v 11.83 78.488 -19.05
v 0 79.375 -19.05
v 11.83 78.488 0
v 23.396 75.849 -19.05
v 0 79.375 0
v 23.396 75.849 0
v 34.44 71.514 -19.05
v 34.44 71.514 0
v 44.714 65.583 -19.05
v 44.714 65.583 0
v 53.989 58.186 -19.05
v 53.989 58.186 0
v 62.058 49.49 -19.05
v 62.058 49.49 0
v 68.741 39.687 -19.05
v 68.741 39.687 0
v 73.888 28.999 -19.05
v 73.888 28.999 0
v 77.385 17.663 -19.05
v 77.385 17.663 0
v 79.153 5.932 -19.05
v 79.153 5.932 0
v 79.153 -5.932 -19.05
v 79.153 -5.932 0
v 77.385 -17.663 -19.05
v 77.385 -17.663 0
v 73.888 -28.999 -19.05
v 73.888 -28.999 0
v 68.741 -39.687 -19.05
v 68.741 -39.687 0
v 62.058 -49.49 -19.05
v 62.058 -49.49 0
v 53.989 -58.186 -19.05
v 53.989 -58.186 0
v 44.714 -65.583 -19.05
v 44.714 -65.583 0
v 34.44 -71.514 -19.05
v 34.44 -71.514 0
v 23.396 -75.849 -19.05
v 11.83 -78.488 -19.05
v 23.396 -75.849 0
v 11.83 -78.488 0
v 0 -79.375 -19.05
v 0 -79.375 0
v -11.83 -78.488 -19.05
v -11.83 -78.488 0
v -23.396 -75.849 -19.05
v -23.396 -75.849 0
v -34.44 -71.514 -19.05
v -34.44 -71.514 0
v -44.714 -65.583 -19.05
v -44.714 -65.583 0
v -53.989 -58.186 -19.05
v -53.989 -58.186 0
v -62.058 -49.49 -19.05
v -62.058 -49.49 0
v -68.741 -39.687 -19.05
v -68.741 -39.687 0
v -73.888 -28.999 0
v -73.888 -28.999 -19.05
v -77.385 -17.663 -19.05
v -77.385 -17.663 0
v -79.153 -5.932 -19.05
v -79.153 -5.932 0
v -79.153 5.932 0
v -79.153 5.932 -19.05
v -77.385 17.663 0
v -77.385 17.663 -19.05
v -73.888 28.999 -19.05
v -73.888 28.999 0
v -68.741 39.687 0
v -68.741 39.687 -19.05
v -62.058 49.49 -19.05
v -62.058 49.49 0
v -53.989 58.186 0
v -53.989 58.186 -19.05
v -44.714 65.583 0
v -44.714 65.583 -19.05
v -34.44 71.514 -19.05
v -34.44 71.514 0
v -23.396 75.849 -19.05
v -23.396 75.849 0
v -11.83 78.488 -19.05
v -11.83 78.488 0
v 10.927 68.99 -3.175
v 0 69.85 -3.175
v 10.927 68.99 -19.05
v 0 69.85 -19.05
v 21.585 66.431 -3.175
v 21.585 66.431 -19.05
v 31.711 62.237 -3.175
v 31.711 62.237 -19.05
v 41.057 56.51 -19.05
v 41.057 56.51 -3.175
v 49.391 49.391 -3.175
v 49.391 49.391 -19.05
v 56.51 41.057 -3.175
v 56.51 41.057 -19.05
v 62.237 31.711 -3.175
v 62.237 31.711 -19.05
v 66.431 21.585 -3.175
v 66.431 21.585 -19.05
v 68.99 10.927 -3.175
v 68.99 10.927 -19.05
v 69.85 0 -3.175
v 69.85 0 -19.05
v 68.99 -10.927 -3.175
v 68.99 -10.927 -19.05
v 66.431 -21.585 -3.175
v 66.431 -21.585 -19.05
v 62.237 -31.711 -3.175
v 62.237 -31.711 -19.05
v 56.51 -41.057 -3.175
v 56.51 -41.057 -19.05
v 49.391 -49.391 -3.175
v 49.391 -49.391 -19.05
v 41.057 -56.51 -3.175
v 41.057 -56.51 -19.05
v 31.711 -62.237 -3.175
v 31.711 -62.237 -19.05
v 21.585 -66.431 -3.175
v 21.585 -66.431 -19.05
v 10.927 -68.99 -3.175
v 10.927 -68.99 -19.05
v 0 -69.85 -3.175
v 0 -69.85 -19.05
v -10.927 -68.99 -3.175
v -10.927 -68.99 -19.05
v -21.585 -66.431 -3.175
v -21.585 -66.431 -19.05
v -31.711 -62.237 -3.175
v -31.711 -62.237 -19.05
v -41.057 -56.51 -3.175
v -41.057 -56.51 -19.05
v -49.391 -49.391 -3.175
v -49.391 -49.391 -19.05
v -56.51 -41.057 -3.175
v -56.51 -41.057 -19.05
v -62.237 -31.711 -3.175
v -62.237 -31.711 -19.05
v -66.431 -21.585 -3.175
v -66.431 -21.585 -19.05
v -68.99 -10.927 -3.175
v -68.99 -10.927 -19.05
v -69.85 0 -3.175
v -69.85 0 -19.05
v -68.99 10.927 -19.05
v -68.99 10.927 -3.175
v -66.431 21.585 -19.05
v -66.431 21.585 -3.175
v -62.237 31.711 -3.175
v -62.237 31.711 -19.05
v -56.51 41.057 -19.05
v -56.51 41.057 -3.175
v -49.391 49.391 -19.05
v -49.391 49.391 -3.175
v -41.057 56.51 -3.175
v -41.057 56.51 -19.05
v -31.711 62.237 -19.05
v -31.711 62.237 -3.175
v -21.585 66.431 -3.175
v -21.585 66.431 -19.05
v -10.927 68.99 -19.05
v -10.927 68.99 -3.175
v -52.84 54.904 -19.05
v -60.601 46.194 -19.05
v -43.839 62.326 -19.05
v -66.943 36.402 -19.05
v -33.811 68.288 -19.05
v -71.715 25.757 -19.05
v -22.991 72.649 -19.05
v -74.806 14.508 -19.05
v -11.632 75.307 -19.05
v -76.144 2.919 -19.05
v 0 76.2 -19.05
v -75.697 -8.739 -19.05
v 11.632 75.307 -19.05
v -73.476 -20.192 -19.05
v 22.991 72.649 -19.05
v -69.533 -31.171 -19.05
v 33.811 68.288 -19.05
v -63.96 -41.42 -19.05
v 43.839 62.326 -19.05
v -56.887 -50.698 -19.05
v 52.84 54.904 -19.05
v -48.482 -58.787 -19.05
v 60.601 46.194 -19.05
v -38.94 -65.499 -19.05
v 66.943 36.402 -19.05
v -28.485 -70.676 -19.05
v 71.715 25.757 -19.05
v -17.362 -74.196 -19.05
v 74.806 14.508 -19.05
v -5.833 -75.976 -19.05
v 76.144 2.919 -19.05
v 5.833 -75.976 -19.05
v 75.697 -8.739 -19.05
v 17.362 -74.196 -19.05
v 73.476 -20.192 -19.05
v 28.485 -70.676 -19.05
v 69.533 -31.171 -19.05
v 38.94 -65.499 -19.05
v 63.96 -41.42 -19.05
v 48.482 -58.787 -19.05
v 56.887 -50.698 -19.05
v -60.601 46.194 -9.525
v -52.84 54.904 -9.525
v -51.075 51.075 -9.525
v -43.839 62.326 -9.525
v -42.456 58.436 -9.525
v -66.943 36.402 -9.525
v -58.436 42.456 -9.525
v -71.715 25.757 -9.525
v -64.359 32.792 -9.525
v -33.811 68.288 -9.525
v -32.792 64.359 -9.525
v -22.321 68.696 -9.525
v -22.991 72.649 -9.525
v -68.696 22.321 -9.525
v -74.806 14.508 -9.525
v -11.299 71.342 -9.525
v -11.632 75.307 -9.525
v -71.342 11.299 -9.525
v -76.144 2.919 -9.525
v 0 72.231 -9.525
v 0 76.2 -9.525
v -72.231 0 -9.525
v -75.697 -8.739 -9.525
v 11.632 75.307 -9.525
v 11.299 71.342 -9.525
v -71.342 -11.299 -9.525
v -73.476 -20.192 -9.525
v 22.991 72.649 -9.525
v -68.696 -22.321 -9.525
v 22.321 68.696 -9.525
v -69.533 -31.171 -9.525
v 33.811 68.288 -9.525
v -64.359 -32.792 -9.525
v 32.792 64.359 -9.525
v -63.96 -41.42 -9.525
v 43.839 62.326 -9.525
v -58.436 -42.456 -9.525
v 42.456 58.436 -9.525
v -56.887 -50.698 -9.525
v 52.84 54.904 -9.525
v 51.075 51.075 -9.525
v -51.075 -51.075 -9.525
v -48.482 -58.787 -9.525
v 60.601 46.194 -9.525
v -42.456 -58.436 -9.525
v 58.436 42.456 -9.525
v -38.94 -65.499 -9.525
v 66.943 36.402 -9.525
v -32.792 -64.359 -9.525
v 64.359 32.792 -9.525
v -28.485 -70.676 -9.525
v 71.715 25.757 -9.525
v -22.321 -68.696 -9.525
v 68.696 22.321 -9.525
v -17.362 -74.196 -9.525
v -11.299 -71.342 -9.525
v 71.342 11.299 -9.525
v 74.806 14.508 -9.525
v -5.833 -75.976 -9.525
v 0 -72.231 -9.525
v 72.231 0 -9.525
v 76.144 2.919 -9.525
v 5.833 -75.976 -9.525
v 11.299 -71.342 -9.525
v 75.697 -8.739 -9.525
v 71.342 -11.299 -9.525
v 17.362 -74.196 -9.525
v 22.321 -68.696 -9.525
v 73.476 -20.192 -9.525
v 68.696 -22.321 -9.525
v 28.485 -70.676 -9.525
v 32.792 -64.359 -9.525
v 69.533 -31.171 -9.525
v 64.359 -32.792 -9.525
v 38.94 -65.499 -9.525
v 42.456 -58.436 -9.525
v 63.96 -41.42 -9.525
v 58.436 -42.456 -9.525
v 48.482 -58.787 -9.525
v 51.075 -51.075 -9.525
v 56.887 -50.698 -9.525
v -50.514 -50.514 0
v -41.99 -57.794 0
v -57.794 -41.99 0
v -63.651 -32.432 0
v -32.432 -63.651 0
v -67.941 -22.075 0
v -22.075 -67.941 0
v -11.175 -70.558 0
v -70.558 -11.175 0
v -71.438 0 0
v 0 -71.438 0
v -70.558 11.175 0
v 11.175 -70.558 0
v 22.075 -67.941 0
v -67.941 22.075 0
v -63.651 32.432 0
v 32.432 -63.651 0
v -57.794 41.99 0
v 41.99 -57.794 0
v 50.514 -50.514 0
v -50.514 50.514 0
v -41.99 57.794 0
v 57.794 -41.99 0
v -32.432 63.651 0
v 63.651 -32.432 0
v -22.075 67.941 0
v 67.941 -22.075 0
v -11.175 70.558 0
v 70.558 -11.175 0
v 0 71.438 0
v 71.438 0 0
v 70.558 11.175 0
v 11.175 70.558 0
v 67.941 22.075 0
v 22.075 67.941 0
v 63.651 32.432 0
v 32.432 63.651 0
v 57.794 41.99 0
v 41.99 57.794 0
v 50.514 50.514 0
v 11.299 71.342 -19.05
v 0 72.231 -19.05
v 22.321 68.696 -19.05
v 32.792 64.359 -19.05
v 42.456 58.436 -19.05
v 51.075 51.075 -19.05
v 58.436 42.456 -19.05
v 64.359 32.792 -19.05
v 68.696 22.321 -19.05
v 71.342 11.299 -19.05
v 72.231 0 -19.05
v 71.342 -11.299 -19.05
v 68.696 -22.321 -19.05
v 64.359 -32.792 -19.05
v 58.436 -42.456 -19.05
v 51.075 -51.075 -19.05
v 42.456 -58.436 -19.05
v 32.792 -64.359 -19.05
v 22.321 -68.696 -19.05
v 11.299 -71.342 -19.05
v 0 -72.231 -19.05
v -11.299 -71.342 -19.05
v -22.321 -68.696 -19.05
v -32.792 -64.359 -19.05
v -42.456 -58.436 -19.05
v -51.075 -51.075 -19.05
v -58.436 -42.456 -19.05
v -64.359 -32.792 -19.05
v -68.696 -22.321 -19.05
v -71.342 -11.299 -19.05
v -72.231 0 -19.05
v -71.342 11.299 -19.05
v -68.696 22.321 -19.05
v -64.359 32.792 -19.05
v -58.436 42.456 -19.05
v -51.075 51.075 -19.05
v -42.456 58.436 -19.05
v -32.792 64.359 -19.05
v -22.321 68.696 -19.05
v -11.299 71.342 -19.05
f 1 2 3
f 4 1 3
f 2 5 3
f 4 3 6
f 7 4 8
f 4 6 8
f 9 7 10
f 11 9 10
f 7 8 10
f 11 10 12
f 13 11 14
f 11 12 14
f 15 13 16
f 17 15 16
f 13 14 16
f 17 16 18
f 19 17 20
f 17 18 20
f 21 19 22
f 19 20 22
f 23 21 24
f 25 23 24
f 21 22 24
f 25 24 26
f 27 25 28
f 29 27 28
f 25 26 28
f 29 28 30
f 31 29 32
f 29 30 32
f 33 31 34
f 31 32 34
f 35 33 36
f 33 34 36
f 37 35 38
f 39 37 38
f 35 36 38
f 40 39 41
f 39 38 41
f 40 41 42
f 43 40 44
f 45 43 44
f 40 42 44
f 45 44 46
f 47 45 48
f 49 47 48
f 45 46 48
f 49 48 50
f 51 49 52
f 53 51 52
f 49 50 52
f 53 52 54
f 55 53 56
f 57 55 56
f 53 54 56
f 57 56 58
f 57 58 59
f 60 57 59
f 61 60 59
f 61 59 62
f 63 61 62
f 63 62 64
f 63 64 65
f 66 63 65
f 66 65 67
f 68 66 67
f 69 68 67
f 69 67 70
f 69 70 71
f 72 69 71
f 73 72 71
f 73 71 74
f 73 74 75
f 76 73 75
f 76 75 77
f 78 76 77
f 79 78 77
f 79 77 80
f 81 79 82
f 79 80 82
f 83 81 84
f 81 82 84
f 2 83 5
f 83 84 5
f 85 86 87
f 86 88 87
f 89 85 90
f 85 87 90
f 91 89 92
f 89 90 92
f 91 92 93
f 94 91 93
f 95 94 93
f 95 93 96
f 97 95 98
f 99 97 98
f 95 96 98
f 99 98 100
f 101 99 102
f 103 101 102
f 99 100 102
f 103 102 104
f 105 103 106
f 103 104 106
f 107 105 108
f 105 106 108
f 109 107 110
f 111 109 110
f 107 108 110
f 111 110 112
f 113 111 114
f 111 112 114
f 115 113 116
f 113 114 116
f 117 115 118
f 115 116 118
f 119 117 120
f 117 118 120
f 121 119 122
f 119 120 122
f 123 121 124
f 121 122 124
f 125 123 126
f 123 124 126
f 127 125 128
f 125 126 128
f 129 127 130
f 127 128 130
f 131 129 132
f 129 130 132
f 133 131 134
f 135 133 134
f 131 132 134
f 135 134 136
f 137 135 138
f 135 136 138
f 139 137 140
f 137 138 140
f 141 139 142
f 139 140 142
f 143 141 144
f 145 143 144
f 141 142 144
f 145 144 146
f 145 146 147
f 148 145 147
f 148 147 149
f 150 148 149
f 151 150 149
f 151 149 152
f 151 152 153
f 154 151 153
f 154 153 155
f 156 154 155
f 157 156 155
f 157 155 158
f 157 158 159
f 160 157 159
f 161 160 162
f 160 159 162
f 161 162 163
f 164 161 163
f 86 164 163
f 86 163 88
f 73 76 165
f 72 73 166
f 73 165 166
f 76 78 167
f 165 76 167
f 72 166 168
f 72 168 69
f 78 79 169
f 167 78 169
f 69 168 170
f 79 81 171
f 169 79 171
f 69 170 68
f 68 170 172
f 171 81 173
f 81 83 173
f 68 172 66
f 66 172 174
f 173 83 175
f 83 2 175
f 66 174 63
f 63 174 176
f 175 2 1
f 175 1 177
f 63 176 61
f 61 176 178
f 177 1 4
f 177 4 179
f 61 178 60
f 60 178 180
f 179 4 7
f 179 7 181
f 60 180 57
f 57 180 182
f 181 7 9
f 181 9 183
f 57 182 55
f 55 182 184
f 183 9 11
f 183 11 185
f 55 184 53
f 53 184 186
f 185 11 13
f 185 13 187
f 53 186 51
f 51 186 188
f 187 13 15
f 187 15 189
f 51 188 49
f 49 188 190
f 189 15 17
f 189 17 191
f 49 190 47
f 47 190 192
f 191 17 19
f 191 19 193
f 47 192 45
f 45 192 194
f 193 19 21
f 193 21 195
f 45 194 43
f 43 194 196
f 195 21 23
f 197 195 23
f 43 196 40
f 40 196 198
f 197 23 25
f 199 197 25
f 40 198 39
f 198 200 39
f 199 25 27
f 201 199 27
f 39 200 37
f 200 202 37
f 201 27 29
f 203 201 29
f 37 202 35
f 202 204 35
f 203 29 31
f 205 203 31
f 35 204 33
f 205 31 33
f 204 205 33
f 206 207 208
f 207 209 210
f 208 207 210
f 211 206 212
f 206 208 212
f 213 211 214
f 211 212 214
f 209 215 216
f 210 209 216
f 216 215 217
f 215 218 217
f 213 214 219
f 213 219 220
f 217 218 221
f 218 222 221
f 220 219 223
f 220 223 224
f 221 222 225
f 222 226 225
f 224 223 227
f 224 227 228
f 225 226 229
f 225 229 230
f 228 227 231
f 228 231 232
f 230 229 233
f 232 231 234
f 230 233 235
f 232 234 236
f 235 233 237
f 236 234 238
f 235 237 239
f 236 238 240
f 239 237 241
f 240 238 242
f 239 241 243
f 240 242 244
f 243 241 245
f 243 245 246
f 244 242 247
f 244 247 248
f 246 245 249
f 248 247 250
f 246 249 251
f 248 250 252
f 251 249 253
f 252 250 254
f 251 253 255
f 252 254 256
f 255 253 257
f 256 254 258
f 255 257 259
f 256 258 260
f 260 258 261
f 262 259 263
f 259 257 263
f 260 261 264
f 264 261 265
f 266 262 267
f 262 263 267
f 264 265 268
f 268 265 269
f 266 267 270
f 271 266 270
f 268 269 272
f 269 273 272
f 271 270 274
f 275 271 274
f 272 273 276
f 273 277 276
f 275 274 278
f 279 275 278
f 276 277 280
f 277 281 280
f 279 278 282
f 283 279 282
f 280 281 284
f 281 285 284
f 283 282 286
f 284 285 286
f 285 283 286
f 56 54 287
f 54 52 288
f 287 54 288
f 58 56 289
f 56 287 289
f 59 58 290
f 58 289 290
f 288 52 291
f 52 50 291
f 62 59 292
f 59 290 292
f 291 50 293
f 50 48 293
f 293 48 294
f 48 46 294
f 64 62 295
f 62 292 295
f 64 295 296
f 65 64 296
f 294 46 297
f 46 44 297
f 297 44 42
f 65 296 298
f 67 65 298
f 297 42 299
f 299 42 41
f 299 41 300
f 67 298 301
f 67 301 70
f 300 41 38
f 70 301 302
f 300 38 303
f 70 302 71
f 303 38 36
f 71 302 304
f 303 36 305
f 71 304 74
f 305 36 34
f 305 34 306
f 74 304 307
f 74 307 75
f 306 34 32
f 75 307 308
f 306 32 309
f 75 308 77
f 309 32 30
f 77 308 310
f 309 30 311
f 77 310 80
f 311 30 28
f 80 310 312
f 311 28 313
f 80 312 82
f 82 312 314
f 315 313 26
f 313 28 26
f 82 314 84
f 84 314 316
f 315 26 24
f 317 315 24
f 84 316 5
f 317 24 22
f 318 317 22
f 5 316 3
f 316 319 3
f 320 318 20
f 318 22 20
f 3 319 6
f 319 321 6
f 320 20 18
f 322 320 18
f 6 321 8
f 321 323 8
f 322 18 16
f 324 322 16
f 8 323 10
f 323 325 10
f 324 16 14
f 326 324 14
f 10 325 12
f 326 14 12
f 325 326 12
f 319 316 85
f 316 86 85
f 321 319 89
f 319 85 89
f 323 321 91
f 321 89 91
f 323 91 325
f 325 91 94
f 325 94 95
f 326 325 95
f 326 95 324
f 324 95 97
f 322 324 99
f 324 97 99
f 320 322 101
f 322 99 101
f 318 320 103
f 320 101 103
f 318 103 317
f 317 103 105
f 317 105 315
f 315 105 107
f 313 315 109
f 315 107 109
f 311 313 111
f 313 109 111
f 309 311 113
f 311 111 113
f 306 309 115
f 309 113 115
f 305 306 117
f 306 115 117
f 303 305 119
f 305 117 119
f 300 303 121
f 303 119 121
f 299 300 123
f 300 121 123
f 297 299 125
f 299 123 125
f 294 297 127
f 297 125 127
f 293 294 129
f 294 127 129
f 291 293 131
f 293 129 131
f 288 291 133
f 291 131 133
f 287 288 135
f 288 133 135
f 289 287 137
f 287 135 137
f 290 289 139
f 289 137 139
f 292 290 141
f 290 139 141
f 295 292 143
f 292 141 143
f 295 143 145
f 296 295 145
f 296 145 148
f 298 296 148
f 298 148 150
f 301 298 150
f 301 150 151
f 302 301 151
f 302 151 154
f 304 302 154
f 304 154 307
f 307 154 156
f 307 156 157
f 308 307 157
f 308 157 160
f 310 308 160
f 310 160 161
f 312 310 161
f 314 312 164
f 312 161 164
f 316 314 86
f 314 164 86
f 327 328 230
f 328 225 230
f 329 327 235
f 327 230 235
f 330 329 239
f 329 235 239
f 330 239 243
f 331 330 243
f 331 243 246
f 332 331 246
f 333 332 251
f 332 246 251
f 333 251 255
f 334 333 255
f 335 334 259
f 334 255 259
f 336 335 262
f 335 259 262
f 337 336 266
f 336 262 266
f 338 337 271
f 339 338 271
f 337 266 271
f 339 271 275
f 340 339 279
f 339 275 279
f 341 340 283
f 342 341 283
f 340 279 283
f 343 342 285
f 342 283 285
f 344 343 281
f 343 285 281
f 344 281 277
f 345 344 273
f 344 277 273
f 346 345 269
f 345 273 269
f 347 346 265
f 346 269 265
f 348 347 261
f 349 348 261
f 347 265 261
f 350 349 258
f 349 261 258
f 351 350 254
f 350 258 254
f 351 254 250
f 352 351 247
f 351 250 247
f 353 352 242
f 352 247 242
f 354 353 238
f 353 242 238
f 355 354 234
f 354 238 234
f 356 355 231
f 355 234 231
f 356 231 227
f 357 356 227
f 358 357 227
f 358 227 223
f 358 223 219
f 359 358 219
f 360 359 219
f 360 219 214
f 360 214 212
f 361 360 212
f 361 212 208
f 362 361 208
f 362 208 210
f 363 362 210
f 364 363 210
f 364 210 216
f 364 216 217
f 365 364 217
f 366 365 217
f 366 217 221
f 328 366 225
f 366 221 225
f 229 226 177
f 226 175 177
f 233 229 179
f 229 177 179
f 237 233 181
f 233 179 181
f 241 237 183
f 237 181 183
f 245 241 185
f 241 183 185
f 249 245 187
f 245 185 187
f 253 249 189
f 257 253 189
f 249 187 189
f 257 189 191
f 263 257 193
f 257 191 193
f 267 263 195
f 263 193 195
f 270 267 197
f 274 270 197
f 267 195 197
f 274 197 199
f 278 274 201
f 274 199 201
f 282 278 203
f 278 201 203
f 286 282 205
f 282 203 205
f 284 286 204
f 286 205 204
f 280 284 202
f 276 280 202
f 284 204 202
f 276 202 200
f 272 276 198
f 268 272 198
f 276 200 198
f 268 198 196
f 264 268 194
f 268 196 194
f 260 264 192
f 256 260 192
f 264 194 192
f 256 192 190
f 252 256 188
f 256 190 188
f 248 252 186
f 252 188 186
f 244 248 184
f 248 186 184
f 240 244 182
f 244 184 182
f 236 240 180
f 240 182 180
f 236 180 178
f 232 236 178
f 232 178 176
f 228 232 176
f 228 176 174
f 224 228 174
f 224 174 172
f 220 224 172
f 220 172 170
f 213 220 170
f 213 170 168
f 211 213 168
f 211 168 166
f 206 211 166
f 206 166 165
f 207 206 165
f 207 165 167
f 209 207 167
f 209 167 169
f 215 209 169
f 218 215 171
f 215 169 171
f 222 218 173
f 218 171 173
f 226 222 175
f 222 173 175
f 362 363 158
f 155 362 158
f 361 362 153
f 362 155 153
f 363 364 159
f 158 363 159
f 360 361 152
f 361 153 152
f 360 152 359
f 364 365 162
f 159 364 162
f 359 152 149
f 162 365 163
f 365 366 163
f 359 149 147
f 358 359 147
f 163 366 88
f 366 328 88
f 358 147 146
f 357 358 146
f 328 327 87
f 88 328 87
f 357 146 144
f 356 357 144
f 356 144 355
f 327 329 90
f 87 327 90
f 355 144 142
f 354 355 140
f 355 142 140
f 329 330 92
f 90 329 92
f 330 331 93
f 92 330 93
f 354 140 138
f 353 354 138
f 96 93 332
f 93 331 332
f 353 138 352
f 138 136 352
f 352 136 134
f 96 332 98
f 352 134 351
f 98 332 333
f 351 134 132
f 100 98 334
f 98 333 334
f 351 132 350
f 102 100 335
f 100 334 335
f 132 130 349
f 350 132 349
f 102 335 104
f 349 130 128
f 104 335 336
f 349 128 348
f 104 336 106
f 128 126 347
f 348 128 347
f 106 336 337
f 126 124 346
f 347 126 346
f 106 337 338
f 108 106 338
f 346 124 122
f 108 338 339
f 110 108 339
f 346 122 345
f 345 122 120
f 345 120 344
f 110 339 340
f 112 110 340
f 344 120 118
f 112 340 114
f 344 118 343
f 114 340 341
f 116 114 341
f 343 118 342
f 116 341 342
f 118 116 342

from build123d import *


with BuildPart() as part:
    # Sketch2 → Revolve1 (revolve)
    with BuildSketch(Plane(origin=(0, 0, 0), x_dir=(0, 0, -1), z_dir=(1, 0, 0))):
        Polygon((0, 71.4375), (3.175, 69.85), (19.05, 69.85), (19.05, 72.23125), (9.525, 72.23125), (9.525, 76.2), (19.05, 76.2), (19.05, 79.375), (0, 79.375), align=None)
    revolve(axis=Axis((0, 0, 0), (0, 0, -1)))


solid = part.part
